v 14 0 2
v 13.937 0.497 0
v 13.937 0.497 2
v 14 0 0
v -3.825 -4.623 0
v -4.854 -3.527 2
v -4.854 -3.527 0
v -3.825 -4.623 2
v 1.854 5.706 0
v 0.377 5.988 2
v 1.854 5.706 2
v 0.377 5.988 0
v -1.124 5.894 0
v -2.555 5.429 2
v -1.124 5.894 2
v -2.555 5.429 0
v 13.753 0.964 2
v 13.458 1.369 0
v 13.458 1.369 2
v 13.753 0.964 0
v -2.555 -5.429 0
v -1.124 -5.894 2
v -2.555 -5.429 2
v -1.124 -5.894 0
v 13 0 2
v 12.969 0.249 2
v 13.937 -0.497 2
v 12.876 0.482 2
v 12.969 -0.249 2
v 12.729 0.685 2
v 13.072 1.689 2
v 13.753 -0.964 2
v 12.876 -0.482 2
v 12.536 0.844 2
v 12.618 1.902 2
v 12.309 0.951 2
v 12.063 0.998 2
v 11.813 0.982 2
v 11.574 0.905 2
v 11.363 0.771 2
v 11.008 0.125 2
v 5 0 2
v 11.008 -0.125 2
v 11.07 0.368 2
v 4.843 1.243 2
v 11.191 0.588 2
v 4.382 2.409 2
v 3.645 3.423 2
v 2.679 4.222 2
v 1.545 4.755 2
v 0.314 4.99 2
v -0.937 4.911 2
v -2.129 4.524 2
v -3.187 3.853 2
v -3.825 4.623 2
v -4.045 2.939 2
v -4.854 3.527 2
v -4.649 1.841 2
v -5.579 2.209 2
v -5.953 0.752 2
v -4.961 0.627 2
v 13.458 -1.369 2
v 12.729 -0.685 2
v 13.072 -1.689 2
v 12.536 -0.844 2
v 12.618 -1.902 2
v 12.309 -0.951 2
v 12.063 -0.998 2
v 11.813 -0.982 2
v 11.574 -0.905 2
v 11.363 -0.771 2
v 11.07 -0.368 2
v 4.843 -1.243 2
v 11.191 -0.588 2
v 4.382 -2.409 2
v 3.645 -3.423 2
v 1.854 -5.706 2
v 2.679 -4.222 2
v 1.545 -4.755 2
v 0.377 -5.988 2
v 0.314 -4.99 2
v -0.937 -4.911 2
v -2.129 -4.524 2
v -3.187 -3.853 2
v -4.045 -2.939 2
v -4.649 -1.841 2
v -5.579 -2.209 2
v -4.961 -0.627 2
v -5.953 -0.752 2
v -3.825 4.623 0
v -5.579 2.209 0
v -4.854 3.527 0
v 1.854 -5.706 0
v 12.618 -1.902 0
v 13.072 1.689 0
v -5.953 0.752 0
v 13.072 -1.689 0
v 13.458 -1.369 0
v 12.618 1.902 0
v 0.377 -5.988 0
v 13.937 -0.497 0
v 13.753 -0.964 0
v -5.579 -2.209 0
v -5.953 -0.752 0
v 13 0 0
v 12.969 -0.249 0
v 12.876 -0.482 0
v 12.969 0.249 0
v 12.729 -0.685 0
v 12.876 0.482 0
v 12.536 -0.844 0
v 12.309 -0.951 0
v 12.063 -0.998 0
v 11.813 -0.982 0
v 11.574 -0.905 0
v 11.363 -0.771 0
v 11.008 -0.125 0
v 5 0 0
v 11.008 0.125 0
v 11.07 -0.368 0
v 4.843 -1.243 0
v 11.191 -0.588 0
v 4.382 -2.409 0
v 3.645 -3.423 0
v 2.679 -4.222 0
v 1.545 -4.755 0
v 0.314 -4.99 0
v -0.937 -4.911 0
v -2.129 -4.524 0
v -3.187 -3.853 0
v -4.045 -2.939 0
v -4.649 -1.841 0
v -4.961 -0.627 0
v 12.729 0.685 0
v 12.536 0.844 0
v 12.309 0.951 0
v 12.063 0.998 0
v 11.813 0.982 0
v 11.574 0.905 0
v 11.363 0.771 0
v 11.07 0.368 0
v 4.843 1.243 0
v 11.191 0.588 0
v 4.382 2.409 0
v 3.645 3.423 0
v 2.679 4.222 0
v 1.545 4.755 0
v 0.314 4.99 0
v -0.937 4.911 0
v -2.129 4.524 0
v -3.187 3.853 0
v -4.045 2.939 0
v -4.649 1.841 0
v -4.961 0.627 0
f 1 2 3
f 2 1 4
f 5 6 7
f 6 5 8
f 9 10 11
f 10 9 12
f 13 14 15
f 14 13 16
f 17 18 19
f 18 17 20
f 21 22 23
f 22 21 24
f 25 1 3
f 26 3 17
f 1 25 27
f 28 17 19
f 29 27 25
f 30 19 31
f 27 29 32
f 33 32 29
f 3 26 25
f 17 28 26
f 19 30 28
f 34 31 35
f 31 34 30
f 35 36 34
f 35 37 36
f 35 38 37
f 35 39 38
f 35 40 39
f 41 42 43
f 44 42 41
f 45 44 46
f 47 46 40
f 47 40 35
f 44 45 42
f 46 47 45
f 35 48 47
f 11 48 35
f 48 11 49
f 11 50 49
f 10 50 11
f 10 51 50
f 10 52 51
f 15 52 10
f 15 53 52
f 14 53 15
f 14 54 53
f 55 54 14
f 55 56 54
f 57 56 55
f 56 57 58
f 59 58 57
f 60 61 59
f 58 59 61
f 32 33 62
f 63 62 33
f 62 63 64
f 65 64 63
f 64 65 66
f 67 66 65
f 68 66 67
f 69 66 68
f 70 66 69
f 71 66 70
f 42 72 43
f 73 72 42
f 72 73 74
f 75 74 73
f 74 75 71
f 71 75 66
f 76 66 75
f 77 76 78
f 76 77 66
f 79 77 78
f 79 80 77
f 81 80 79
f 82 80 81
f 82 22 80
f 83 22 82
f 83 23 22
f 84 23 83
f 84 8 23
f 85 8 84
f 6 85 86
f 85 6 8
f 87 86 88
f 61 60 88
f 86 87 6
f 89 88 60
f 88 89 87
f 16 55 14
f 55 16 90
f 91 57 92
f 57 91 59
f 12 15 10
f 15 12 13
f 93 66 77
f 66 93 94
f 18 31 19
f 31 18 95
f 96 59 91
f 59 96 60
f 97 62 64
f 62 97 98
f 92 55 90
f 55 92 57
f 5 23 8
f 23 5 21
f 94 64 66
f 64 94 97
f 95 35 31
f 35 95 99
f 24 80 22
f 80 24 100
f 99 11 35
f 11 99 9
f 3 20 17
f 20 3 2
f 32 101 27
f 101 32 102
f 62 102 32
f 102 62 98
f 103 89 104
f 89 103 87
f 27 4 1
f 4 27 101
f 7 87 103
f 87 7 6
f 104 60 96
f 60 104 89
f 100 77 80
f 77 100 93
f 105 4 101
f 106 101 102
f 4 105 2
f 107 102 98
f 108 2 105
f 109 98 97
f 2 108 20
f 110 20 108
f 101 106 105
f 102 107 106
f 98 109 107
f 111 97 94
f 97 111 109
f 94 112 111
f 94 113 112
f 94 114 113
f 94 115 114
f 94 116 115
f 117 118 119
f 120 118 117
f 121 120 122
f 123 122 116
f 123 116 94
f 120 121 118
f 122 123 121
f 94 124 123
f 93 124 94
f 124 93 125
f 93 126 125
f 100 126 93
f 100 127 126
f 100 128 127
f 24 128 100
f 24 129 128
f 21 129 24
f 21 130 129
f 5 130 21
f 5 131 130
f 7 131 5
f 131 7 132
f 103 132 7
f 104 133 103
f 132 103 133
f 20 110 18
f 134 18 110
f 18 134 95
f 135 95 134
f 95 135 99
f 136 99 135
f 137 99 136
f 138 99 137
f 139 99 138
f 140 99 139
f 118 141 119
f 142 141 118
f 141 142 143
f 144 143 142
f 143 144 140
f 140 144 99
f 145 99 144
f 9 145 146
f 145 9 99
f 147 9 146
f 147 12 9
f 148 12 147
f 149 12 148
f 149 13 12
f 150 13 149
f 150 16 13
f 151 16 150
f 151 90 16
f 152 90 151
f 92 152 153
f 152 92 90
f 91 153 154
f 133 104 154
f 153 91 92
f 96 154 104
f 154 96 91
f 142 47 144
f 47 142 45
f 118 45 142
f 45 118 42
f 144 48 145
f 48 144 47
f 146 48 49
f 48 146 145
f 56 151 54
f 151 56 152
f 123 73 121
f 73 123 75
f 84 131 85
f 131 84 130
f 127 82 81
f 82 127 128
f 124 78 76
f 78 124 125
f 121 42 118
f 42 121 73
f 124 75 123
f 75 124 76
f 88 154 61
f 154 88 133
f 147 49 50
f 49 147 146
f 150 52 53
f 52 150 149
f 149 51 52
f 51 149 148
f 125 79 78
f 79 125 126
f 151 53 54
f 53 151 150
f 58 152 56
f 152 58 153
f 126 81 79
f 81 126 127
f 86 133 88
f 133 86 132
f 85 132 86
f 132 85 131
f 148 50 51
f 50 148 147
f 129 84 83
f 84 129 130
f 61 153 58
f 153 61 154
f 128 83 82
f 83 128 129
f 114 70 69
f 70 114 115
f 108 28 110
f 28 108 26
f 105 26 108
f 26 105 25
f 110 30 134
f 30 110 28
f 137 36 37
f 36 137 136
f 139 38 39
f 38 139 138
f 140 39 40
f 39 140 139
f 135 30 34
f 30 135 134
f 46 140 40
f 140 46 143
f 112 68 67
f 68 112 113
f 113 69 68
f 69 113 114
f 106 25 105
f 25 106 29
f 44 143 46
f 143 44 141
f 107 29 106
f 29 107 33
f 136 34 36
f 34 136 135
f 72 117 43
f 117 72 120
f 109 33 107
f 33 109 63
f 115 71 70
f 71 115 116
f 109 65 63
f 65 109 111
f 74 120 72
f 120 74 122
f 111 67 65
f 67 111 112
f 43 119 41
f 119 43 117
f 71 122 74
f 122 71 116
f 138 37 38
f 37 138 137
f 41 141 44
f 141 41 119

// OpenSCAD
$fn=25;

ring_od = 12;
ring_id = 10;

string_hole_od = 4;
string_hole_id = 2;

thk = 2;
hole_centres = 12;

difference()
{
hull()
{
    cylinder(d=ring_od,h=thk);
    translate([hole_centres,0,0])
    cylinder(d=string_hole_od,h=thk);
}

    cylinder(d=ring_id,h=thk);
    translate([hole_centres,0,0])
        cylinder(d=string_hole_id,h=thk);
}
